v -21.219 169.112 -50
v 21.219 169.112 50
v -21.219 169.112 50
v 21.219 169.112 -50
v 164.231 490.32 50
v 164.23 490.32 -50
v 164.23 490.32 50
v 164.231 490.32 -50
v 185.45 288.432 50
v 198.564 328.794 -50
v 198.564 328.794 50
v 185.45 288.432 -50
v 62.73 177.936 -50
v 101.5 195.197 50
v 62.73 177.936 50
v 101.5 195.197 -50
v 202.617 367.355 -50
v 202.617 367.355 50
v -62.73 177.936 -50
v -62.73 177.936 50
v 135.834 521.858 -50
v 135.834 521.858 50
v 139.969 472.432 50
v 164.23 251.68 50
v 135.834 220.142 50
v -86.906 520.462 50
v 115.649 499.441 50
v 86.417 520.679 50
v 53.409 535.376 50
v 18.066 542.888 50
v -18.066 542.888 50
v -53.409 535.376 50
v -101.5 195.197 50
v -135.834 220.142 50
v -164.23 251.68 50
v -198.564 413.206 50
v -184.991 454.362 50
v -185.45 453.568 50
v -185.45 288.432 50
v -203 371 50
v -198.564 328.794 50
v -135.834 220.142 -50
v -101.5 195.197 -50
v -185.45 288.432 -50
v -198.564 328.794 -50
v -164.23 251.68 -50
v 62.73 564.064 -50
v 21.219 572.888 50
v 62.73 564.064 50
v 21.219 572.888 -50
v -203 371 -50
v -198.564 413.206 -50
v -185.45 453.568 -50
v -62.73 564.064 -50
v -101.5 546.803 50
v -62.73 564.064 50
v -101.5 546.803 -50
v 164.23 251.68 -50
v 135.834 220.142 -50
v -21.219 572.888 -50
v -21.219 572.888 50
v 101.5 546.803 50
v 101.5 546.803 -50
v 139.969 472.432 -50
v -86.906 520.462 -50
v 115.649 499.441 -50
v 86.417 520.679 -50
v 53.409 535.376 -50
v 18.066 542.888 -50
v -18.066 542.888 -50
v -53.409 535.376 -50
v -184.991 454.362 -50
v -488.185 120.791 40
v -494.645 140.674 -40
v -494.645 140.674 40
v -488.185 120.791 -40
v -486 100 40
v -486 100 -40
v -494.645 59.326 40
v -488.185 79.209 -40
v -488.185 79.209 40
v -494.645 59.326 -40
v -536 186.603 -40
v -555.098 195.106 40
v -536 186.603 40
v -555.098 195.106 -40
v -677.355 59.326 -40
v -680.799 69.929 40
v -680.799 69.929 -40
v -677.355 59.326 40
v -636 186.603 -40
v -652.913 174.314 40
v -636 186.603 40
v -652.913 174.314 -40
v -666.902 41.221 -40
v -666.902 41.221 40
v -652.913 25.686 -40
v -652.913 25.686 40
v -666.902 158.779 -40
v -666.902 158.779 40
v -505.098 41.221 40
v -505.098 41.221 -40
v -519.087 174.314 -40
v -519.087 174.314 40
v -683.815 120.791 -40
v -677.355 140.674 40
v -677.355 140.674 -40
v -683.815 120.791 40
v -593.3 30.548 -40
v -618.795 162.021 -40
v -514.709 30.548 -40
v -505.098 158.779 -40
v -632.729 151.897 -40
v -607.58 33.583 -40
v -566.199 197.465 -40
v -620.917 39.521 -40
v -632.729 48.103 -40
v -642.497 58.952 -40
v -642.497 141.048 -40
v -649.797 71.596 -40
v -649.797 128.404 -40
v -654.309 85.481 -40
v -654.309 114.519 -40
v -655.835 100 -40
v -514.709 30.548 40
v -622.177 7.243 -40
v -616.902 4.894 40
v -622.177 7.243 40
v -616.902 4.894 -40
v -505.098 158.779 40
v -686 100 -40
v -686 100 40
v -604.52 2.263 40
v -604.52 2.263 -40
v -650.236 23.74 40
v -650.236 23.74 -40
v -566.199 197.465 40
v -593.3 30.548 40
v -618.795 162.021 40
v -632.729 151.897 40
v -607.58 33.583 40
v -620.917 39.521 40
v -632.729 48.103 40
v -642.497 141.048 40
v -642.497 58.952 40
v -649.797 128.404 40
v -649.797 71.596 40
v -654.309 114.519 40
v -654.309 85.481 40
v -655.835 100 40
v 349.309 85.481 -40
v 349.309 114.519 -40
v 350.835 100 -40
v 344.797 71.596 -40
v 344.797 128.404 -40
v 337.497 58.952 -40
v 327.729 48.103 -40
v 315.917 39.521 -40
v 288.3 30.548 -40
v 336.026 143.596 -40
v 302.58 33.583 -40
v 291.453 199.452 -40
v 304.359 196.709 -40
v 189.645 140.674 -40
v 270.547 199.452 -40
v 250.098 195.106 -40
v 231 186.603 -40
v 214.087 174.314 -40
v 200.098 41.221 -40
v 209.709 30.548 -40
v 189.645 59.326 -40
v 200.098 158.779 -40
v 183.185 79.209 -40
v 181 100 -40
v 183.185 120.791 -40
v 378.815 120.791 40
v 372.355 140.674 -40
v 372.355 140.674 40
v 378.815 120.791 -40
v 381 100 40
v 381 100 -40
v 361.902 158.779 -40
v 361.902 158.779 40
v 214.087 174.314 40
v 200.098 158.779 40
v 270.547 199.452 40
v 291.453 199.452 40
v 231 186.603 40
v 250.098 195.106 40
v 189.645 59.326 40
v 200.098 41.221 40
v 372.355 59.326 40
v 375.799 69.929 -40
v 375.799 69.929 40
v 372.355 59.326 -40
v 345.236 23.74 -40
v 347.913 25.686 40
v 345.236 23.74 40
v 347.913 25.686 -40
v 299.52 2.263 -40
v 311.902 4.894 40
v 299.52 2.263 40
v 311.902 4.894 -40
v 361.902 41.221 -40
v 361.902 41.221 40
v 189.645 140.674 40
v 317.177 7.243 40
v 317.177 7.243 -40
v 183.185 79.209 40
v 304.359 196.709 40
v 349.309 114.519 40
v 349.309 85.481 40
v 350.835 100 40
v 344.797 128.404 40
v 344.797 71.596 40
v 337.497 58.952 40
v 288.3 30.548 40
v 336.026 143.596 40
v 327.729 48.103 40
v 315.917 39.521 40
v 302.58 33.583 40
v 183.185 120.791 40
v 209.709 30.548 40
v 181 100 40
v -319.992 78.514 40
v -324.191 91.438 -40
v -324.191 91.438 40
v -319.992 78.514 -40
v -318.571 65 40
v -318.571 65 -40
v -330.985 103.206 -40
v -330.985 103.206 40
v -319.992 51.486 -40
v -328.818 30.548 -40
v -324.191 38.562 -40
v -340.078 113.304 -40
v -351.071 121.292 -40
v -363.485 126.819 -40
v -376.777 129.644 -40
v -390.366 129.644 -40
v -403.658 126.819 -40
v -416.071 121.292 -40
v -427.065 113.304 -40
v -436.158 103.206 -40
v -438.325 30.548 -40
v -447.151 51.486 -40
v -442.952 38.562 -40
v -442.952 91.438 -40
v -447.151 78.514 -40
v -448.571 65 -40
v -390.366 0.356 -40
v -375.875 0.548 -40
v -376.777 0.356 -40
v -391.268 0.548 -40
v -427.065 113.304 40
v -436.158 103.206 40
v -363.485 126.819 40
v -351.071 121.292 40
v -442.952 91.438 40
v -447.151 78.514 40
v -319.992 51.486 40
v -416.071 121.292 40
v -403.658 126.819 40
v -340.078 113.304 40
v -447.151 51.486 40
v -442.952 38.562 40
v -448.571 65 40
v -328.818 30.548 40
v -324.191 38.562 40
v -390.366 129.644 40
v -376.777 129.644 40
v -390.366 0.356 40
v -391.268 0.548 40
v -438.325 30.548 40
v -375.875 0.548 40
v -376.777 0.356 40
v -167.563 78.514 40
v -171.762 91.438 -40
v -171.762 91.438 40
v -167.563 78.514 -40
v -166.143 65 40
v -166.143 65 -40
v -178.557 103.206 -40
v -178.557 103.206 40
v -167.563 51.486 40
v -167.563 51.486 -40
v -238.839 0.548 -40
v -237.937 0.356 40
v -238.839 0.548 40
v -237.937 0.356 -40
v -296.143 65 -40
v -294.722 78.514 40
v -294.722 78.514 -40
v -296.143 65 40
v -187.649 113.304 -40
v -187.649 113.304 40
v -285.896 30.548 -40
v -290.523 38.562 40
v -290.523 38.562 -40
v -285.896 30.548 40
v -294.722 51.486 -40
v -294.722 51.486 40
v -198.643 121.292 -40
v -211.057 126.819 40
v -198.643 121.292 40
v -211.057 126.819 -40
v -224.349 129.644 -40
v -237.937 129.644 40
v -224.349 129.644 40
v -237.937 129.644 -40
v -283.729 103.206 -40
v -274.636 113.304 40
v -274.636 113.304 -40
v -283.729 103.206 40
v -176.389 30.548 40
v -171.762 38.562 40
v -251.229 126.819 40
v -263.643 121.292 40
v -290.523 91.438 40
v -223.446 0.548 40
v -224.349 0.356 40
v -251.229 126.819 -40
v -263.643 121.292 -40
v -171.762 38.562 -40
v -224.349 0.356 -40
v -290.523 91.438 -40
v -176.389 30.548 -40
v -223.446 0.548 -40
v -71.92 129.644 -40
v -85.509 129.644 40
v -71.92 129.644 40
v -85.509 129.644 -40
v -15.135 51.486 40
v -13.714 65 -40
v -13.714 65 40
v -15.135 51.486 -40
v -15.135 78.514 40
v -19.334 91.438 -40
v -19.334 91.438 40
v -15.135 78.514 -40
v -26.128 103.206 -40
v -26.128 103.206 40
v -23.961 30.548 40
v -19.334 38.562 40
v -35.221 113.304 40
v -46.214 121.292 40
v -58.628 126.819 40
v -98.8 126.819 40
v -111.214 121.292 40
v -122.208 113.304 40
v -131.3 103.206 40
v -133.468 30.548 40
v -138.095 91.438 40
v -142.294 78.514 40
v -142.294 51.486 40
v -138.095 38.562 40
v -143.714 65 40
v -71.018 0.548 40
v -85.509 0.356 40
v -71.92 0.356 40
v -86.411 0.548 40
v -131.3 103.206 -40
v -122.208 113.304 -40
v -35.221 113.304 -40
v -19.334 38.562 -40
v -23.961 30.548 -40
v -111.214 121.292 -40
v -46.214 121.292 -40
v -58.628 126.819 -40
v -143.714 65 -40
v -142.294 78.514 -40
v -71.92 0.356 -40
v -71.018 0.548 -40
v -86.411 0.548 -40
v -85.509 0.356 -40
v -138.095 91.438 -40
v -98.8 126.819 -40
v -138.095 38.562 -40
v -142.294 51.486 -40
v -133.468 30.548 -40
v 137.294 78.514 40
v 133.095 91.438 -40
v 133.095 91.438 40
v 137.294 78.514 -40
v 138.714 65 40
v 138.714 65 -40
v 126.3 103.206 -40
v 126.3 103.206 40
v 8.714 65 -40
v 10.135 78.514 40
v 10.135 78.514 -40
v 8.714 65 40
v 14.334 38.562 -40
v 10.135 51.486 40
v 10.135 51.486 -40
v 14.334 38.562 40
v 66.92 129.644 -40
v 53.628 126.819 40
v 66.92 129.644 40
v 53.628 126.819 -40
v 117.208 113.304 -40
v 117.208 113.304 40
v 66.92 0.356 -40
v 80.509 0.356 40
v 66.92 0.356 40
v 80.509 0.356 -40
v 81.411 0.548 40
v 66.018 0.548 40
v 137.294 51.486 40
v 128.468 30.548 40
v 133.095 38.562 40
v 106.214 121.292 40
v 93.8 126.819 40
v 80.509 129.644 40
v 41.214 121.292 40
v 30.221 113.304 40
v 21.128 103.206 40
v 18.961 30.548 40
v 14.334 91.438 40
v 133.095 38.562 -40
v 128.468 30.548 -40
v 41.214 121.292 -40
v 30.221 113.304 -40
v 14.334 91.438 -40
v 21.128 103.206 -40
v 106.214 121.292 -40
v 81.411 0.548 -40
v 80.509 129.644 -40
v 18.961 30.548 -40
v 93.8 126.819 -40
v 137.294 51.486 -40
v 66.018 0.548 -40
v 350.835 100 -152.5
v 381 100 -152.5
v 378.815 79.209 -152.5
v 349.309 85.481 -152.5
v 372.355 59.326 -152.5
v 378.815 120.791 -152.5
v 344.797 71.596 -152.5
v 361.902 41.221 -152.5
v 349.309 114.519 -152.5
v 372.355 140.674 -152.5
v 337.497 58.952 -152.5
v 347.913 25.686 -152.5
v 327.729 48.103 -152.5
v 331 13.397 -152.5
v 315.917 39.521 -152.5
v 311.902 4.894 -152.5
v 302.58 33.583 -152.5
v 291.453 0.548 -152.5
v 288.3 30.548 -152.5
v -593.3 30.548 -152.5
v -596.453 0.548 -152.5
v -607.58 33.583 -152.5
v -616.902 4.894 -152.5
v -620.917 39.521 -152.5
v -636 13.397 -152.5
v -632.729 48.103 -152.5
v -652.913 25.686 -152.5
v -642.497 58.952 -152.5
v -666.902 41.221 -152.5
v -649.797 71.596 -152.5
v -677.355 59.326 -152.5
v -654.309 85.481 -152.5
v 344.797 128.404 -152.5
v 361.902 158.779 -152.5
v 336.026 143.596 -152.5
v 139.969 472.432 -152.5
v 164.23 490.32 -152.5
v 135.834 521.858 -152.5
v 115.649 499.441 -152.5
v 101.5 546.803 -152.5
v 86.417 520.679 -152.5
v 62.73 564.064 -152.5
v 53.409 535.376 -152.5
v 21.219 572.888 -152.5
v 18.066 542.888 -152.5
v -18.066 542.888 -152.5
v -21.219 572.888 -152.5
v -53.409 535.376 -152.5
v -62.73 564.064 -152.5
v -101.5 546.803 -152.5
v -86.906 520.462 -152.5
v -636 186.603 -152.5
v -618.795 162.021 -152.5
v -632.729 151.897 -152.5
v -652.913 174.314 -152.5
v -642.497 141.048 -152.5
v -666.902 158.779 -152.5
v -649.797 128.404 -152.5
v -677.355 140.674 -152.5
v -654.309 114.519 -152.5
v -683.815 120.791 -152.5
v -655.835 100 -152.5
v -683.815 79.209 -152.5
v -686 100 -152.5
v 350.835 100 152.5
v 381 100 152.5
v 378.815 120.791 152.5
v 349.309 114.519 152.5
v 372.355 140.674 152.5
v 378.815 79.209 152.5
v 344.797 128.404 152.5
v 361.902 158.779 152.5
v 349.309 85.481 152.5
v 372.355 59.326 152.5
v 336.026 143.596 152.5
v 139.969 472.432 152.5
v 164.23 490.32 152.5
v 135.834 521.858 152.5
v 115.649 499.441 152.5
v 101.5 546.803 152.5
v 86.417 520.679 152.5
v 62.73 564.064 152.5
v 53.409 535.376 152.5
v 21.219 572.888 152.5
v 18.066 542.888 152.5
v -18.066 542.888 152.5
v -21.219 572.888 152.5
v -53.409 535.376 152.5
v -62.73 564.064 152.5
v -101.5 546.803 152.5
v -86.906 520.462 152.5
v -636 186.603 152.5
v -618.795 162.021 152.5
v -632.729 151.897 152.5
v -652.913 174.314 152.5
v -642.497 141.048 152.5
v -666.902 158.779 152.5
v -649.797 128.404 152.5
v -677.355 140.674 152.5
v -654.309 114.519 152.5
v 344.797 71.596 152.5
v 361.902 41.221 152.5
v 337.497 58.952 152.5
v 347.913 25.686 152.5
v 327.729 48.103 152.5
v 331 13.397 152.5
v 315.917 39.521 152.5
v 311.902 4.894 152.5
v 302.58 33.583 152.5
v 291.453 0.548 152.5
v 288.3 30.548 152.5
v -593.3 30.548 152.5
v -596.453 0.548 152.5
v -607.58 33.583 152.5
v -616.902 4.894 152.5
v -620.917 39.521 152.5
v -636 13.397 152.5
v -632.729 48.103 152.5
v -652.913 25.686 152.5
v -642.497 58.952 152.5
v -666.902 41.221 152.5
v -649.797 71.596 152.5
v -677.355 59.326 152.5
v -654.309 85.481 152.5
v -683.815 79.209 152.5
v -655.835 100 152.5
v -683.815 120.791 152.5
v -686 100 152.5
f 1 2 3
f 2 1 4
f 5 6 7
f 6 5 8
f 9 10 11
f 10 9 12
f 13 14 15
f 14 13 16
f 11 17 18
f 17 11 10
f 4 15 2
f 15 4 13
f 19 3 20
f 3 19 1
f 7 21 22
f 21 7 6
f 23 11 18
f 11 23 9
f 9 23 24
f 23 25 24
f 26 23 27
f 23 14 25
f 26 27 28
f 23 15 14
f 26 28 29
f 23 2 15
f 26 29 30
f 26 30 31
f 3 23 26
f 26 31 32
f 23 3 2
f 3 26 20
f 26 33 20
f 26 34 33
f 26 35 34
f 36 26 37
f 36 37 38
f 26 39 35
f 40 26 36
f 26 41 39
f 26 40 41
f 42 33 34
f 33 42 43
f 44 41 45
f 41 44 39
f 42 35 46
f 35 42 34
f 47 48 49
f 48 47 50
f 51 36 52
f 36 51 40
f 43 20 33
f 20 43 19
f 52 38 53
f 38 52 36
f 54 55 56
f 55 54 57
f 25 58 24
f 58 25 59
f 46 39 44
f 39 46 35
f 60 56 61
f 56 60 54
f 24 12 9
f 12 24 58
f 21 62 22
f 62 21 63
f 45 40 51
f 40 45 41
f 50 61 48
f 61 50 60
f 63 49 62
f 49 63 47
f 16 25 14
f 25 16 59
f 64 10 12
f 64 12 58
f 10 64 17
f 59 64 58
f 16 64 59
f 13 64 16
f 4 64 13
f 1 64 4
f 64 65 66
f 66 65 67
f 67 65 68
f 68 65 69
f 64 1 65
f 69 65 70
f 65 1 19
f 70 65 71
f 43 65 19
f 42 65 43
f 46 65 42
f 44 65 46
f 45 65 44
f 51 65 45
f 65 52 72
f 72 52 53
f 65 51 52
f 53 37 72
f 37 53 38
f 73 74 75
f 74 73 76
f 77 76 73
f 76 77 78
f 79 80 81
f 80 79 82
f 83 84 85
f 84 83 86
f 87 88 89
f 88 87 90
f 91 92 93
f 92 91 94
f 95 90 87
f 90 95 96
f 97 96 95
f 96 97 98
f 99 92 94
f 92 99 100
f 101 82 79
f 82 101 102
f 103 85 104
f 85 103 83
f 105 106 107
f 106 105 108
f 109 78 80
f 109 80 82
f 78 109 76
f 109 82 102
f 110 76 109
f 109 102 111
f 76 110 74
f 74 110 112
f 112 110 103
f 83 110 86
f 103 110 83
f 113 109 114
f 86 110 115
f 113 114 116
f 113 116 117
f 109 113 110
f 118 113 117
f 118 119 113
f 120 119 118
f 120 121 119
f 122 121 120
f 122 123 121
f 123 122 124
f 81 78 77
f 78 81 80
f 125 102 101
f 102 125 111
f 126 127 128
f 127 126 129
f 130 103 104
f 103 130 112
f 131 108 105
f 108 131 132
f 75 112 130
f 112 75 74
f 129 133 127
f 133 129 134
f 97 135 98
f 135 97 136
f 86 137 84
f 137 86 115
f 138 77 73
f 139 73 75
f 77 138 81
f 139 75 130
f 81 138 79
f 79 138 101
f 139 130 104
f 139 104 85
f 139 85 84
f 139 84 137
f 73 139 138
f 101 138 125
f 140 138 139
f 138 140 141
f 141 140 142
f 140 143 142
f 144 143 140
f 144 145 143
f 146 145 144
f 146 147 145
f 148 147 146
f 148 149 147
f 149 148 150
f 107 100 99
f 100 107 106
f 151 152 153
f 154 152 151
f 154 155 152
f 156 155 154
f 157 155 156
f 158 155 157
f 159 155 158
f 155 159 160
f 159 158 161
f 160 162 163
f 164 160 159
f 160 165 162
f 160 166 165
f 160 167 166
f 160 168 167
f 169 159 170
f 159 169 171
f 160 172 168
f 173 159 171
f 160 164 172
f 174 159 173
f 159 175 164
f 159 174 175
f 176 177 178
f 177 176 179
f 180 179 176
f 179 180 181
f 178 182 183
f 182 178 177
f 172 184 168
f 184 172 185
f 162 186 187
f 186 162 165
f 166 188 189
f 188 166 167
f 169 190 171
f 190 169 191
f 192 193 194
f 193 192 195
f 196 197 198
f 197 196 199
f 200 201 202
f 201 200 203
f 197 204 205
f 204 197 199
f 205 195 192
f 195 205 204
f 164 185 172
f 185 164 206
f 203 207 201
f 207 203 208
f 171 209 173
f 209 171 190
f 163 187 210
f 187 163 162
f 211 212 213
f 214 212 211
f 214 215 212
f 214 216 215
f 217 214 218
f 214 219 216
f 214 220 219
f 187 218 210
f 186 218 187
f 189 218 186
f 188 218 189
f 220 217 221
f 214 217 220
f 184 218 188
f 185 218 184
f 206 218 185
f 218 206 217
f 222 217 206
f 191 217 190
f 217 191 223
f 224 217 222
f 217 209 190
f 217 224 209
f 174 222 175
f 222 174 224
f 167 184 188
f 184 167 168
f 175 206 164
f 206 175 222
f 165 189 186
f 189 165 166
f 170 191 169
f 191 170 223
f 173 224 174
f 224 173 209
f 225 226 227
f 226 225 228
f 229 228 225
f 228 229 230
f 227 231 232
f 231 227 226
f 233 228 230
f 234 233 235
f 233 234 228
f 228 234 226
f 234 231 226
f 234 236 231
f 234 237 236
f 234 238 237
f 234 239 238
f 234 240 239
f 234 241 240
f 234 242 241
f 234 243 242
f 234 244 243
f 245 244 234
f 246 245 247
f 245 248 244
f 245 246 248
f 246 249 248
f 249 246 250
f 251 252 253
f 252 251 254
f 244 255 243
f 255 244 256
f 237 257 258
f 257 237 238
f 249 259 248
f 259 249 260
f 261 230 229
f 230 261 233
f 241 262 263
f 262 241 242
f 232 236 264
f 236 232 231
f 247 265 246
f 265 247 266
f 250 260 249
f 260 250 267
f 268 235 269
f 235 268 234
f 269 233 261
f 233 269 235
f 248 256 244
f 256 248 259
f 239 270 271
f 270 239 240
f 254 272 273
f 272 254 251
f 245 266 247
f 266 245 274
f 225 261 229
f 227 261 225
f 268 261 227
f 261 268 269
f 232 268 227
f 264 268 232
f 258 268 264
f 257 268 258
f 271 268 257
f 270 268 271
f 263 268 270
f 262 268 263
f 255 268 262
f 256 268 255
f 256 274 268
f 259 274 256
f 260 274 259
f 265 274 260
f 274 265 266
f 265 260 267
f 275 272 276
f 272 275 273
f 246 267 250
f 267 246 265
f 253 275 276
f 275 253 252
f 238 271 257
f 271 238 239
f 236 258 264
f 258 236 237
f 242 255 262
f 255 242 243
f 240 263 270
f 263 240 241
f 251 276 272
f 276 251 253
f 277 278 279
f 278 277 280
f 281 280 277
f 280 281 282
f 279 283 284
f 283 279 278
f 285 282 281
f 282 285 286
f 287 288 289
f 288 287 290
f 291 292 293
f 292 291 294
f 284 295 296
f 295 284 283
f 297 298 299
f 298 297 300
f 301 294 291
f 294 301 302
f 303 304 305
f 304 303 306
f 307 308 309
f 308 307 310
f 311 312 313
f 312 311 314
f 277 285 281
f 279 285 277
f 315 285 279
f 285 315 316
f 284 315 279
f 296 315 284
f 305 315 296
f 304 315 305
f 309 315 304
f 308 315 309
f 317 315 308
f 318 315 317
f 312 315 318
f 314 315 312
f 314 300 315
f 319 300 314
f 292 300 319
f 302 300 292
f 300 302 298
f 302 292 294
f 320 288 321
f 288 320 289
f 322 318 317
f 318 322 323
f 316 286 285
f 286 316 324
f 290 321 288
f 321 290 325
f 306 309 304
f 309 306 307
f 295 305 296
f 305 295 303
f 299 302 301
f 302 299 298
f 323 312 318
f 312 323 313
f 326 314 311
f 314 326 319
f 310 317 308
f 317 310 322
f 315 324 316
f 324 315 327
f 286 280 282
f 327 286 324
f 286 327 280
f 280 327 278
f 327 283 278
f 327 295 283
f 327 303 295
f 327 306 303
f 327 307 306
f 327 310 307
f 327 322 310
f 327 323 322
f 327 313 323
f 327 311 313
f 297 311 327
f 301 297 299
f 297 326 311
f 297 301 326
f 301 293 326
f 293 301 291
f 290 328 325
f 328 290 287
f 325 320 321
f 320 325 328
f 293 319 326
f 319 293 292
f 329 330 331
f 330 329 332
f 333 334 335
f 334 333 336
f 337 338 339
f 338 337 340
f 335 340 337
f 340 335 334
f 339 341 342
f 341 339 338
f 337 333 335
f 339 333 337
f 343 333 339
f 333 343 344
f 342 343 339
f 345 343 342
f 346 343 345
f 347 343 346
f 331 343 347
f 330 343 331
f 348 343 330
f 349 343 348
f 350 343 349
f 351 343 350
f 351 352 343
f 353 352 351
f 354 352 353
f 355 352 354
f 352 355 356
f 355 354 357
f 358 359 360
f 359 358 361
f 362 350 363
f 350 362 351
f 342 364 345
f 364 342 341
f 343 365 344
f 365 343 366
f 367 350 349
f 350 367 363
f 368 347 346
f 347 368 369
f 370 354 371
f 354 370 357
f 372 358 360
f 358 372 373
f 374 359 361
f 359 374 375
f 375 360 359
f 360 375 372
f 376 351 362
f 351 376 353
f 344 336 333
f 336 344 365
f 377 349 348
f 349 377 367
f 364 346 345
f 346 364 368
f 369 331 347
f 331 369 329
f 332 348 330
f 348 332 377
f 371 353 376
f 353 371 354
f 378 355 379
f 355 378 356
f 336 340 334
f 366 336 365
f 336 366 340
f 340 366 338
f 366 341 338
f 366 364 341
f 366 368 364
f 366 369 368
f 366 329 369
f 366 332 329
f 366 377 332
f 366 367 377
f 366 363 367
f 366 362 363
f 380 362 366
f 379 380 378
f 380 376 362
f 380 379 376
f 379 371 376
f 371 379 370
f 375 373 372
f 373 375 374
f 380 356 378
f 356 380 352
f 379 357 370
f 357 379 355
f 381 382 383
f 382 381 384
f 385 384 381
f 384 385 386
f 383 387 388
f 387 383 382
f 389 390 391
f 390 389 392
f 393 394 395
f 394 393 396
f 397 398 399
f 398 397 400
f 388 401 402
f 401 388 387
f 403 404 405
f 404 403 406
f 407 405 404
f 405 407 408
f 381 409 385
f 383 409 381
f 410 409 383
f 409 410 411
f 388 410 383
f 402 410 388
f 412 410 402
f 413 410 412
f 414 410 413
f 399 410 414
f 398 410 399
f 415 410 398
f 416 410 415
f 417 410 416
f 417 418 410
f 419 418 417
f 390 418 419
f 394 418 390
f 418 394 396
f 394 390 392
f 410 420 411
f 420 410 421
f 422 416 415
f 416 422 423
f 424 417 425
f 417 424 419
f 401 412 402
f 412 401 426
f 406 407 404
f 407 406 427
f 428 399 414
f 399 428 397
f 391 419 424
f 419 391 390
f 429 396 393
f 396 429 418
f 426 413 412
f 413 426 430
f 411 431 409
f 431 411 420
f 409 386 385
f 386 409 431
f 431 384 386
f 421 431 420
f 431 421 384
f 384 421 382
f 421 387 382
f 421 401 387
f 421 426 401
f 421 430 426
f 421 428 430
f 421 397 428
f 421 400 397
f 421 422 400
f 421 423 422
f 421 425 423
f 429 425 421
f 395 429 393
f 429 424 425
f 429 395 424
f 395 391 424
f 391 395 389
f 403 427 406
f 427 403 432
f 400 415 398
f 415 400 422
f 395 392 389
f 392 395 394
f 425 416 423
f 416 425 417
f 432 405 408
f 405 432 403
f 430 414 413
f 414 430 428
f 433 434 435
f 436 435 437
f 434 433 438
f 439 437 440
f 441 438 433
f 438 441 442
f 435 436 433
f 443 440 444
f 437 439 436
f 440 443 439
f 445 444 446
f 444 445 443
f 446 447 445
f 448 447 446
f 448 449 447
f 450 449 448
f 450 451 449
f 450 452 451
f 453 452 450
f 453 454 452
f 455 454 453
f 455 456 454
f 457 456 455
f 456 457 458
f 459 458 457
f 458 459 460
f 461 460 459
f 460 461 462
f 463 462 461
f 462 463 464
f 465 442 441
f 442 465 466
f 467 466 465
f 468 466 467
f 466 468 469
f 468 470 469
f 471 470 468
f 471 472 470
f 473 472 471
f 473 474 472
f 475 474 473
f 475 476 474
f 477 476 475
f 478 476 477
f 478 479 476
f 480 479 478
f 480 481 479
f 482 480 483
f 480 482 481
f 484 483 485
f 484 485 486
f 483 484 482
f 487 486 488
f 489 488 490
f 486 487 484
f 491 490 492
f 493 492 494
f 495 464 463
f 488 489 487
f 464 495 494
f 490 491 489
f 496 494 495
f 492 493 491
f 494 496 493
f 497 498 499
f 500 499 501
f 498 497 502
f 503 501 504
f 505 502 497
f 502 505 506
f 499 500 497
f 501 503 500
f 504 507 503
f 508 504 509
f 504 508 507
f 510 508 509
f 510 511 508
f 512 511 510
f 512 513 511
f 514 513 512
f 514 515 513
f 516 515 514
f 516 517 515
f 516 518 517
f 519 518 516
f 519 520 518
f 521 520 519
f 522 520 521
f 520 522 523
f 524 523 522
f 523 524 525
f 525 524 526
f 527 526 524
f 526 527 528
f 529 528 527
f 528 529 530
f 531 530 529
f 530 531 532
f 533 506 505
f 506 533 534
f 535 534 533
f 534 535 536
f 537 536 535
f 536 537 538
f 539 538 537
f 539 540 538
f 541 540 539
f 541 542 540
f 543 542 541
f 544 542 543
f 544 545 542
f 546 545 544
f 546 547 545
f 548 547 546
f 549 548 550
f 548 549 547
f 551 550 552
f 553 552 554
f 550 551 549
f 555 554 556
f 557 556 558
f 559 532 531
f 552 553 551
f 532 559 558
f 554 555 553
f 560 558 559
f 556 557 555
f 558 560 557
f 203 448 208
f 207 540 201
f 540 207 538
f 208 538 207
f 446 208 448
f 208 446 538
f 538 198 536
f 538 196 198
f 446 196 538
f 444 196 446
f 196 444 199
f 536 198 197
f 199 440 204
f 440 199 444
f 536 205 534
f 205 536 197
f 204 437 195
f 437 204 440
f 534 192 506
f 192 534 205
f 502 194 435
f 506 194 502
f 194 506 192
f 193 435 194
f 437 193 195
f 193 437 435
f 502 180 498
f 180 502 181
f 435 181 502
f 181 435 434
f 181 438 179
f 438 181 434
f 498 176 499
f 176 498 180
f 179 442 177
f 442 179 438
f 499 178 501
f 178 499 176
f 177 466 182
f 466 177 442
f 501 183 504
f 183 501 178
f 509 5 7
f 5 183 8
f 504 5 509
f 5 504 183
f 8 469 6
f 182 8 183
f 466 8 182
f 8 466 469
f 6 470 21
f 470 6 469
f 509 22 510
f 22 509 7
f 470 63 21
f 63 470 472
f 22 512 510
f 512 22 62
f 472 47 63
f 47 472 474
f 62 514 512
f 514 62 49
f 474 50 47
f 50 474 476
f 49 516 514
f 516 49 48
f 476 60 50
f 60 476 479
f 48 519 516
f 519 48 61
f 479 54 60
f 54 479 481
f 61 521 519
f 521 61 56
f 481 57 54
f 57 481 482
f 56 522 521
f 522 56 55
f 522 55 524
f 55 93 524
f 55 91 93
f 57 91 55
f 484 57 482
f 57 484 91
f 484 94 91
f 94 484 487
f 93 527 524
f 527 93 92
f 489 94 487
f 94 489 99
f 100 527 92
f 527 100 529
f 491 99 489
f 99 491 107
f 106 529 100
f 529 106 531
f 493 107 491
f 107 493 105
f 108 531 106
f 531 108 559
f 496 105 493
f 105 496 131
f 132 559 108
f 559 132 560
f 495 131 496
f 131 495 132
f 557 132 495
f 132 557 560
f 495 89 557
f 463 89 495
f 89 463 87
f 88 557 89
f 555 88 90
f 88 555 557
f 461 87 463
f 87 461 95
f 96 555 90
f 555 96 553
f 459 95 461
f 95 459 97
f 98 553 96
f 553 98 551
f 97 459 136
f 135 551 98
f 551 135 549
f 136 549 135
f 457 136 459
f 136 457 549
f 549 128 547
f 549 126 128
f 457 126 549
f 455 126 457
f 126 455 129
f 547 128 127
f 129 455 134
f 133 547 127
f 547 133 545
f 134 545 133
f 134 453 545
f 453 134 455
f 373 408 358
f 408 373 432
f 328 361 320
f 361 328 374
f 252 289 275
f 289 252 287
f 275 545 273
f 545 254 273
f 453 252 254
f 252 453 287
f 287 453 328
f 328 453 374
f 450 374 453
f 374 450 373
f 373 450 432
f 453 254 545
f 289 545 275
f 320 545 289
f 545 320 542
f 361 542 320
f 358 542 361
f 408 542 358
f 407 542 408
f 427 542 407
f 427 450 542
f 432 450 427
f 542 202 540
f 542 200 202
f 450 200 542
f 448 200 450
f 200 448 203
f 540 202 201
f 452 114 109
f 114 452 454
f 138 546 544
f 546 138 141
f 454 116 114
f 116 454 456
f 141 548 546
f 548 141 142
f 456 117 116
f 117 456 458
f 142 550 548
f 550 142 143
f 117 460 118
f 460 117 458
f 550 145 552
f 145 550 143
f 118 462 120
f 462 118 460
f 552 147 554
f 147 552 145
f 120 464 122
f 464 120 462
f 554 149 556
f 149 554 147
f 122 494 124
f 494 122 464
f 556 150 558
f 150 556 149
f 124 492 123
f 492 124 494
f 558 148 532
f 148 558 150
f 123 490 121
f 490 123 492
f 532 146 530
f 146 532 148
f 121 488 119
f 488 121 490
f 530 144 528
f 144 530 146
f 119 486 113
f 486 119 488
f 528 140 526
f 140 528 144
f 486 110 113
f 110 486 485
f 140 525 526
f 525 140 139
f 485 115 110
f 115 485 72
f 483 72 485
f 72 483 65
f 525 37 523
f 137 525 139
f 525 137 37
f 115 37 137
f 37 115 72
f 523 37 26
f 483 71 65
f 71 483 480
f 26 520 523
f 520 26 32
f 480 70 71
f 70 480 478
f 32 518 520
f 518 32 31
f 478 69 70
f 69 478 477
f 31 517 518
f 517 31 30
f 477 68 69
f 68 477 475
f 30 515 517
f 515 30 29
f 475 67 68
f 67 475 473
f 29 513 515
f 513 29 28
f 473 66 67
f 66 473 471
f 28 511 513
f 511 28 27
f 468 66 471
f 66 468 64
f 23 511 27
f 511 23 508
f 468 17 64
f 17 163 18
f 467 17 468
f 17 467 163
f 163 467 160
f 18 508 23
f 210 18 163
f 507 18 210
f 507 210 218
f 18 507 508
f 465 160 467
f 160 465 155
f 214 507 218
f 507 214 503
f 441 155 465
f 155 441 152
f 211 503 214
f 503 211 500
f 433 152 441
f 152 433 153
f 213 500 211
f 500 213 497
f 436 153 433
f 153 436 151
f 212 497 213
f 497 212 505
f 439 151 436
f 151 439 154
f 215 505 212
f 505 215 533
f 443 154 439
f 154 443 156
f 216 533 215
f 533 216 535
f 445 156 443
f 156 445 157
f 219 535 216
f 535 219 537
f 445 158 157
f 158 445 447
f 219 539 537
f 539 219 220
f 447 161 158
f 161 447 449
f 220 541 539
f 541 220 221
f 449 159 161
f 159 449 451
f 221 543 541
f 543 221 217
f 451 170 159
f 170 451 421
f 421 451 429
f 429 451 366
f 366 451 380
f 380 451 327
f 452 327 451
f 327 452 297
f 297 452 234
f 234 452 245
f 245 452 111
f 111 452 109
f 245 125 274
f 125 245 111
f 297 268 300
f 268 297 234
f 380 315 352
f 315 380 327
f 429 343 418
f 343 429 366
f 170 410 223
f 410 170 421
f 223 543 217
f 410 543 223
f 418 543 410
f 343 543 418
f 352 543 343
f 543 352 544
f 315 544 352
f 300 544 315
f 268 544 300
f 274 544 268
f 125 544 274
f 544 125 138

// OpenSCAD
// CAMSO X4S - REAR
// https://powersports.camso.co/en-ca/atv-utv/track-systems/x4s


/*
Drive type
Internal drive
Sprocket
15 to 18 teeth
Frame
Carbon steel
Anti-rotation
Redesigned mild steel anti-rotation single rate spring and progressive damper.
Quick connect steering limiter design.
Weight
F: 32.7 kg
R: 35.8 kg
Mount kit: 2.72 kg (approx.)
Hub & bearings
Cast steel multi-bolt (4) pattern
Wheels & bearings
134 & 202 mm double bearing wheels. Standard and replaceable sealed bearings. Elastomer outer band. Bladder-type wheel cap.
Rubber track design
F: Flex
R: Flat
Track length
F: 236.2 cm
R: 248.9 cm
Track lug height
F: 2.54 cm
R: 2.54 cm
Track width
F: 27.9 cm
R: 30.5 cm


System length
F: 101.6 cm
R: 106.7 cm

Offset length
F: 61 cm
R: 68.6 cm

System width
F: 27.9 cm
R: 30.5 cm

Offset width
15.2 cm

Ground clearance
F: 39 cm
R: 37.1 cm

System height
F: 58.4 cm
R: 58.4 cm
*/


pas_sirka = 1067; // mm

pas_offset = 686; // mm

pas_width = 305; // mm

pas_osa_nad_zemi = 371; 

pas_vyska = 584; // mm

idlerWheelRadius = 100;
mainWheelRadius = 203;
supportWheelRadius = 65;

CasmoRearModel();

module CasmoRearModel() {

    color("gray") {
    
        WheelsPosition();

        for (i=[1:4]) {
            translate([-pas_offset+pas_sirka/7*i+supportWheelRadius*2+20,supportWheelRadius,0])
            SupportWheel();

        }


        Pas();

    }

}



module Pas() {

linear_extrude(height = pas_width, convexity = 10, center = true) 
difference() {
    CasmoRearShape();
    offset(r = -30)
    CasmoRearShape();
    
}

}


module CasmoRearShape() {
    hull()
    projection(cut = true)
    WheelsPosition();

}


module WheelsPosition() {

translate([0,pas_osa_nad_zemi,0])
MainWheel();


translate([-(pas_offset-idlerWheelRadius),idlerWheelRadius,0])
IdlerWheel();

translate([(pas_sirka-pas_offset)-idlerWheelRadius,idlerWheelRadius,0])
IdlerWheel();

}

module MainWheel() {

    cylinder(r=mainWheelRadius, h=100, center=true);

}

module IdlerWheel() {

    cylinder(r=idlerWheelRadius, h=80, center=true);

}

module SupportWheel() {

    cylinder(r=supportWheelRadius, h=80, center=true);

}
